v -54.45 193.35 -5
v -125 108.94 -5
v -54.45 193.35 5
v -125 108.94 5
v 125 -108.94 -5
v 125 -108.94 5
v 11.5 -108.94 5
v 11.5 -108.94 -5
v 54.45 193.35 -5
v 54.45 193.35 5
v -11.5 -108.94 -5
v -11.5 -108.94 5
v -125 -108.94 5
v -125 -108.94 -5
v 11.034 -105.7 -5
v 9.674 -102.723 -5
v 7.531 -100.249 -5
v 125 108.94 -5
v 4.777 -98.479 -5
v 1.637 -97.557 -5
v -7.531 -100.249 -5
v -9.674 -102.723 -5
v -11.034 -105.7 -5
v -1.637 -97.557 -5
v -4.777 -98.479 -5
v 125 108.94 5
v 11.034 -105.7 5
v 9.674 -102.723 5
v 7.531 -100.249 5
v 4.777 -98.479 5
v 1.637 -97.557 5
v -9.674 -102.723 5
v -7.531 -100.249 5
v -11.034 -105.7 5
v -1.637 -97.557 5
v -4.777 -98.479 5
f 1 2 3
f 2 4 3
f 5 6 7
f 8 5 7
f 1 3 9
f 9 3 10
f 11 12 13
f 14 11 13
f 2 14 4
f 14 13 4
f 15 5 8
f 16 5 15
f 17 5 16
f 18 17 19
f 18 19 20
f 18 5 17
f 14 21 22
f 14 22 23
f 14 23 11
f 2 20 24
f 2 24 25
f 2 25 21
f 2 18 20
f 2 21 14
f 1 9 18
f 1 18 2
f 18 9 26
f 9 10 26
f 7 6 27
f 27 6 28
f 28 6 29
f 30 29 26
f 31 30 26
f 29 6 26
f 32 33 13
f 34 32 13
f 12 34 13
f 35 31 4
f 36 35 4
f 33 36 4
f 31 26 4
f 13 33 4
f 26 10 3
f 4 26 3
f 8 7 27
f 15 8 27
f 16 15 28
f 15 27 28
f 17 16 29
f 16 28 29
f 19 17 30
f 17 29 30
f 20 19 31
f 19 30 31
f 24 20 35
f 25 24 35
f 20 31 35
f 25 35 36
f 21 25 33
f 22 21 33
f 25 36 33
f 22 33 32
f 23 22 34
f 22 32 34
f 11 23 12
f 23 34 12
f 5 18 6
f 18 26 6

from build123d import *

# Parameters (mm, degrees)
BOSS_EXTRUDE2_DEPTH = 5


with BuildPart() as part:
    # Sketch1 → Boss-Extrude2 (new body, symmetric)
    with BuildSketch(Plane.XY):
        with BuildLine():
            Line((-11.5, -108.94), (-125, -108.94))
            Line((-125, -108.94), (-125, 108.94))
            Line((-125, 108.94), (-54.45, 193.35))
            Line((-54.45, 193.35), (54.45, 193.35))
            Line((54.45, 193.35), (125, 108.94))
            Line((125, 108.94), (125, -108.94))
            Line((125, -108.94), (11.5, -108.94))
            ThreePointArc((11.5, -108.94), (0, -97.44), (-11.5, -108.94))
        make_face()
    extrude(amount=BOSS_EXTRUDE2_DEPTH, both=True)


solid = part.part
